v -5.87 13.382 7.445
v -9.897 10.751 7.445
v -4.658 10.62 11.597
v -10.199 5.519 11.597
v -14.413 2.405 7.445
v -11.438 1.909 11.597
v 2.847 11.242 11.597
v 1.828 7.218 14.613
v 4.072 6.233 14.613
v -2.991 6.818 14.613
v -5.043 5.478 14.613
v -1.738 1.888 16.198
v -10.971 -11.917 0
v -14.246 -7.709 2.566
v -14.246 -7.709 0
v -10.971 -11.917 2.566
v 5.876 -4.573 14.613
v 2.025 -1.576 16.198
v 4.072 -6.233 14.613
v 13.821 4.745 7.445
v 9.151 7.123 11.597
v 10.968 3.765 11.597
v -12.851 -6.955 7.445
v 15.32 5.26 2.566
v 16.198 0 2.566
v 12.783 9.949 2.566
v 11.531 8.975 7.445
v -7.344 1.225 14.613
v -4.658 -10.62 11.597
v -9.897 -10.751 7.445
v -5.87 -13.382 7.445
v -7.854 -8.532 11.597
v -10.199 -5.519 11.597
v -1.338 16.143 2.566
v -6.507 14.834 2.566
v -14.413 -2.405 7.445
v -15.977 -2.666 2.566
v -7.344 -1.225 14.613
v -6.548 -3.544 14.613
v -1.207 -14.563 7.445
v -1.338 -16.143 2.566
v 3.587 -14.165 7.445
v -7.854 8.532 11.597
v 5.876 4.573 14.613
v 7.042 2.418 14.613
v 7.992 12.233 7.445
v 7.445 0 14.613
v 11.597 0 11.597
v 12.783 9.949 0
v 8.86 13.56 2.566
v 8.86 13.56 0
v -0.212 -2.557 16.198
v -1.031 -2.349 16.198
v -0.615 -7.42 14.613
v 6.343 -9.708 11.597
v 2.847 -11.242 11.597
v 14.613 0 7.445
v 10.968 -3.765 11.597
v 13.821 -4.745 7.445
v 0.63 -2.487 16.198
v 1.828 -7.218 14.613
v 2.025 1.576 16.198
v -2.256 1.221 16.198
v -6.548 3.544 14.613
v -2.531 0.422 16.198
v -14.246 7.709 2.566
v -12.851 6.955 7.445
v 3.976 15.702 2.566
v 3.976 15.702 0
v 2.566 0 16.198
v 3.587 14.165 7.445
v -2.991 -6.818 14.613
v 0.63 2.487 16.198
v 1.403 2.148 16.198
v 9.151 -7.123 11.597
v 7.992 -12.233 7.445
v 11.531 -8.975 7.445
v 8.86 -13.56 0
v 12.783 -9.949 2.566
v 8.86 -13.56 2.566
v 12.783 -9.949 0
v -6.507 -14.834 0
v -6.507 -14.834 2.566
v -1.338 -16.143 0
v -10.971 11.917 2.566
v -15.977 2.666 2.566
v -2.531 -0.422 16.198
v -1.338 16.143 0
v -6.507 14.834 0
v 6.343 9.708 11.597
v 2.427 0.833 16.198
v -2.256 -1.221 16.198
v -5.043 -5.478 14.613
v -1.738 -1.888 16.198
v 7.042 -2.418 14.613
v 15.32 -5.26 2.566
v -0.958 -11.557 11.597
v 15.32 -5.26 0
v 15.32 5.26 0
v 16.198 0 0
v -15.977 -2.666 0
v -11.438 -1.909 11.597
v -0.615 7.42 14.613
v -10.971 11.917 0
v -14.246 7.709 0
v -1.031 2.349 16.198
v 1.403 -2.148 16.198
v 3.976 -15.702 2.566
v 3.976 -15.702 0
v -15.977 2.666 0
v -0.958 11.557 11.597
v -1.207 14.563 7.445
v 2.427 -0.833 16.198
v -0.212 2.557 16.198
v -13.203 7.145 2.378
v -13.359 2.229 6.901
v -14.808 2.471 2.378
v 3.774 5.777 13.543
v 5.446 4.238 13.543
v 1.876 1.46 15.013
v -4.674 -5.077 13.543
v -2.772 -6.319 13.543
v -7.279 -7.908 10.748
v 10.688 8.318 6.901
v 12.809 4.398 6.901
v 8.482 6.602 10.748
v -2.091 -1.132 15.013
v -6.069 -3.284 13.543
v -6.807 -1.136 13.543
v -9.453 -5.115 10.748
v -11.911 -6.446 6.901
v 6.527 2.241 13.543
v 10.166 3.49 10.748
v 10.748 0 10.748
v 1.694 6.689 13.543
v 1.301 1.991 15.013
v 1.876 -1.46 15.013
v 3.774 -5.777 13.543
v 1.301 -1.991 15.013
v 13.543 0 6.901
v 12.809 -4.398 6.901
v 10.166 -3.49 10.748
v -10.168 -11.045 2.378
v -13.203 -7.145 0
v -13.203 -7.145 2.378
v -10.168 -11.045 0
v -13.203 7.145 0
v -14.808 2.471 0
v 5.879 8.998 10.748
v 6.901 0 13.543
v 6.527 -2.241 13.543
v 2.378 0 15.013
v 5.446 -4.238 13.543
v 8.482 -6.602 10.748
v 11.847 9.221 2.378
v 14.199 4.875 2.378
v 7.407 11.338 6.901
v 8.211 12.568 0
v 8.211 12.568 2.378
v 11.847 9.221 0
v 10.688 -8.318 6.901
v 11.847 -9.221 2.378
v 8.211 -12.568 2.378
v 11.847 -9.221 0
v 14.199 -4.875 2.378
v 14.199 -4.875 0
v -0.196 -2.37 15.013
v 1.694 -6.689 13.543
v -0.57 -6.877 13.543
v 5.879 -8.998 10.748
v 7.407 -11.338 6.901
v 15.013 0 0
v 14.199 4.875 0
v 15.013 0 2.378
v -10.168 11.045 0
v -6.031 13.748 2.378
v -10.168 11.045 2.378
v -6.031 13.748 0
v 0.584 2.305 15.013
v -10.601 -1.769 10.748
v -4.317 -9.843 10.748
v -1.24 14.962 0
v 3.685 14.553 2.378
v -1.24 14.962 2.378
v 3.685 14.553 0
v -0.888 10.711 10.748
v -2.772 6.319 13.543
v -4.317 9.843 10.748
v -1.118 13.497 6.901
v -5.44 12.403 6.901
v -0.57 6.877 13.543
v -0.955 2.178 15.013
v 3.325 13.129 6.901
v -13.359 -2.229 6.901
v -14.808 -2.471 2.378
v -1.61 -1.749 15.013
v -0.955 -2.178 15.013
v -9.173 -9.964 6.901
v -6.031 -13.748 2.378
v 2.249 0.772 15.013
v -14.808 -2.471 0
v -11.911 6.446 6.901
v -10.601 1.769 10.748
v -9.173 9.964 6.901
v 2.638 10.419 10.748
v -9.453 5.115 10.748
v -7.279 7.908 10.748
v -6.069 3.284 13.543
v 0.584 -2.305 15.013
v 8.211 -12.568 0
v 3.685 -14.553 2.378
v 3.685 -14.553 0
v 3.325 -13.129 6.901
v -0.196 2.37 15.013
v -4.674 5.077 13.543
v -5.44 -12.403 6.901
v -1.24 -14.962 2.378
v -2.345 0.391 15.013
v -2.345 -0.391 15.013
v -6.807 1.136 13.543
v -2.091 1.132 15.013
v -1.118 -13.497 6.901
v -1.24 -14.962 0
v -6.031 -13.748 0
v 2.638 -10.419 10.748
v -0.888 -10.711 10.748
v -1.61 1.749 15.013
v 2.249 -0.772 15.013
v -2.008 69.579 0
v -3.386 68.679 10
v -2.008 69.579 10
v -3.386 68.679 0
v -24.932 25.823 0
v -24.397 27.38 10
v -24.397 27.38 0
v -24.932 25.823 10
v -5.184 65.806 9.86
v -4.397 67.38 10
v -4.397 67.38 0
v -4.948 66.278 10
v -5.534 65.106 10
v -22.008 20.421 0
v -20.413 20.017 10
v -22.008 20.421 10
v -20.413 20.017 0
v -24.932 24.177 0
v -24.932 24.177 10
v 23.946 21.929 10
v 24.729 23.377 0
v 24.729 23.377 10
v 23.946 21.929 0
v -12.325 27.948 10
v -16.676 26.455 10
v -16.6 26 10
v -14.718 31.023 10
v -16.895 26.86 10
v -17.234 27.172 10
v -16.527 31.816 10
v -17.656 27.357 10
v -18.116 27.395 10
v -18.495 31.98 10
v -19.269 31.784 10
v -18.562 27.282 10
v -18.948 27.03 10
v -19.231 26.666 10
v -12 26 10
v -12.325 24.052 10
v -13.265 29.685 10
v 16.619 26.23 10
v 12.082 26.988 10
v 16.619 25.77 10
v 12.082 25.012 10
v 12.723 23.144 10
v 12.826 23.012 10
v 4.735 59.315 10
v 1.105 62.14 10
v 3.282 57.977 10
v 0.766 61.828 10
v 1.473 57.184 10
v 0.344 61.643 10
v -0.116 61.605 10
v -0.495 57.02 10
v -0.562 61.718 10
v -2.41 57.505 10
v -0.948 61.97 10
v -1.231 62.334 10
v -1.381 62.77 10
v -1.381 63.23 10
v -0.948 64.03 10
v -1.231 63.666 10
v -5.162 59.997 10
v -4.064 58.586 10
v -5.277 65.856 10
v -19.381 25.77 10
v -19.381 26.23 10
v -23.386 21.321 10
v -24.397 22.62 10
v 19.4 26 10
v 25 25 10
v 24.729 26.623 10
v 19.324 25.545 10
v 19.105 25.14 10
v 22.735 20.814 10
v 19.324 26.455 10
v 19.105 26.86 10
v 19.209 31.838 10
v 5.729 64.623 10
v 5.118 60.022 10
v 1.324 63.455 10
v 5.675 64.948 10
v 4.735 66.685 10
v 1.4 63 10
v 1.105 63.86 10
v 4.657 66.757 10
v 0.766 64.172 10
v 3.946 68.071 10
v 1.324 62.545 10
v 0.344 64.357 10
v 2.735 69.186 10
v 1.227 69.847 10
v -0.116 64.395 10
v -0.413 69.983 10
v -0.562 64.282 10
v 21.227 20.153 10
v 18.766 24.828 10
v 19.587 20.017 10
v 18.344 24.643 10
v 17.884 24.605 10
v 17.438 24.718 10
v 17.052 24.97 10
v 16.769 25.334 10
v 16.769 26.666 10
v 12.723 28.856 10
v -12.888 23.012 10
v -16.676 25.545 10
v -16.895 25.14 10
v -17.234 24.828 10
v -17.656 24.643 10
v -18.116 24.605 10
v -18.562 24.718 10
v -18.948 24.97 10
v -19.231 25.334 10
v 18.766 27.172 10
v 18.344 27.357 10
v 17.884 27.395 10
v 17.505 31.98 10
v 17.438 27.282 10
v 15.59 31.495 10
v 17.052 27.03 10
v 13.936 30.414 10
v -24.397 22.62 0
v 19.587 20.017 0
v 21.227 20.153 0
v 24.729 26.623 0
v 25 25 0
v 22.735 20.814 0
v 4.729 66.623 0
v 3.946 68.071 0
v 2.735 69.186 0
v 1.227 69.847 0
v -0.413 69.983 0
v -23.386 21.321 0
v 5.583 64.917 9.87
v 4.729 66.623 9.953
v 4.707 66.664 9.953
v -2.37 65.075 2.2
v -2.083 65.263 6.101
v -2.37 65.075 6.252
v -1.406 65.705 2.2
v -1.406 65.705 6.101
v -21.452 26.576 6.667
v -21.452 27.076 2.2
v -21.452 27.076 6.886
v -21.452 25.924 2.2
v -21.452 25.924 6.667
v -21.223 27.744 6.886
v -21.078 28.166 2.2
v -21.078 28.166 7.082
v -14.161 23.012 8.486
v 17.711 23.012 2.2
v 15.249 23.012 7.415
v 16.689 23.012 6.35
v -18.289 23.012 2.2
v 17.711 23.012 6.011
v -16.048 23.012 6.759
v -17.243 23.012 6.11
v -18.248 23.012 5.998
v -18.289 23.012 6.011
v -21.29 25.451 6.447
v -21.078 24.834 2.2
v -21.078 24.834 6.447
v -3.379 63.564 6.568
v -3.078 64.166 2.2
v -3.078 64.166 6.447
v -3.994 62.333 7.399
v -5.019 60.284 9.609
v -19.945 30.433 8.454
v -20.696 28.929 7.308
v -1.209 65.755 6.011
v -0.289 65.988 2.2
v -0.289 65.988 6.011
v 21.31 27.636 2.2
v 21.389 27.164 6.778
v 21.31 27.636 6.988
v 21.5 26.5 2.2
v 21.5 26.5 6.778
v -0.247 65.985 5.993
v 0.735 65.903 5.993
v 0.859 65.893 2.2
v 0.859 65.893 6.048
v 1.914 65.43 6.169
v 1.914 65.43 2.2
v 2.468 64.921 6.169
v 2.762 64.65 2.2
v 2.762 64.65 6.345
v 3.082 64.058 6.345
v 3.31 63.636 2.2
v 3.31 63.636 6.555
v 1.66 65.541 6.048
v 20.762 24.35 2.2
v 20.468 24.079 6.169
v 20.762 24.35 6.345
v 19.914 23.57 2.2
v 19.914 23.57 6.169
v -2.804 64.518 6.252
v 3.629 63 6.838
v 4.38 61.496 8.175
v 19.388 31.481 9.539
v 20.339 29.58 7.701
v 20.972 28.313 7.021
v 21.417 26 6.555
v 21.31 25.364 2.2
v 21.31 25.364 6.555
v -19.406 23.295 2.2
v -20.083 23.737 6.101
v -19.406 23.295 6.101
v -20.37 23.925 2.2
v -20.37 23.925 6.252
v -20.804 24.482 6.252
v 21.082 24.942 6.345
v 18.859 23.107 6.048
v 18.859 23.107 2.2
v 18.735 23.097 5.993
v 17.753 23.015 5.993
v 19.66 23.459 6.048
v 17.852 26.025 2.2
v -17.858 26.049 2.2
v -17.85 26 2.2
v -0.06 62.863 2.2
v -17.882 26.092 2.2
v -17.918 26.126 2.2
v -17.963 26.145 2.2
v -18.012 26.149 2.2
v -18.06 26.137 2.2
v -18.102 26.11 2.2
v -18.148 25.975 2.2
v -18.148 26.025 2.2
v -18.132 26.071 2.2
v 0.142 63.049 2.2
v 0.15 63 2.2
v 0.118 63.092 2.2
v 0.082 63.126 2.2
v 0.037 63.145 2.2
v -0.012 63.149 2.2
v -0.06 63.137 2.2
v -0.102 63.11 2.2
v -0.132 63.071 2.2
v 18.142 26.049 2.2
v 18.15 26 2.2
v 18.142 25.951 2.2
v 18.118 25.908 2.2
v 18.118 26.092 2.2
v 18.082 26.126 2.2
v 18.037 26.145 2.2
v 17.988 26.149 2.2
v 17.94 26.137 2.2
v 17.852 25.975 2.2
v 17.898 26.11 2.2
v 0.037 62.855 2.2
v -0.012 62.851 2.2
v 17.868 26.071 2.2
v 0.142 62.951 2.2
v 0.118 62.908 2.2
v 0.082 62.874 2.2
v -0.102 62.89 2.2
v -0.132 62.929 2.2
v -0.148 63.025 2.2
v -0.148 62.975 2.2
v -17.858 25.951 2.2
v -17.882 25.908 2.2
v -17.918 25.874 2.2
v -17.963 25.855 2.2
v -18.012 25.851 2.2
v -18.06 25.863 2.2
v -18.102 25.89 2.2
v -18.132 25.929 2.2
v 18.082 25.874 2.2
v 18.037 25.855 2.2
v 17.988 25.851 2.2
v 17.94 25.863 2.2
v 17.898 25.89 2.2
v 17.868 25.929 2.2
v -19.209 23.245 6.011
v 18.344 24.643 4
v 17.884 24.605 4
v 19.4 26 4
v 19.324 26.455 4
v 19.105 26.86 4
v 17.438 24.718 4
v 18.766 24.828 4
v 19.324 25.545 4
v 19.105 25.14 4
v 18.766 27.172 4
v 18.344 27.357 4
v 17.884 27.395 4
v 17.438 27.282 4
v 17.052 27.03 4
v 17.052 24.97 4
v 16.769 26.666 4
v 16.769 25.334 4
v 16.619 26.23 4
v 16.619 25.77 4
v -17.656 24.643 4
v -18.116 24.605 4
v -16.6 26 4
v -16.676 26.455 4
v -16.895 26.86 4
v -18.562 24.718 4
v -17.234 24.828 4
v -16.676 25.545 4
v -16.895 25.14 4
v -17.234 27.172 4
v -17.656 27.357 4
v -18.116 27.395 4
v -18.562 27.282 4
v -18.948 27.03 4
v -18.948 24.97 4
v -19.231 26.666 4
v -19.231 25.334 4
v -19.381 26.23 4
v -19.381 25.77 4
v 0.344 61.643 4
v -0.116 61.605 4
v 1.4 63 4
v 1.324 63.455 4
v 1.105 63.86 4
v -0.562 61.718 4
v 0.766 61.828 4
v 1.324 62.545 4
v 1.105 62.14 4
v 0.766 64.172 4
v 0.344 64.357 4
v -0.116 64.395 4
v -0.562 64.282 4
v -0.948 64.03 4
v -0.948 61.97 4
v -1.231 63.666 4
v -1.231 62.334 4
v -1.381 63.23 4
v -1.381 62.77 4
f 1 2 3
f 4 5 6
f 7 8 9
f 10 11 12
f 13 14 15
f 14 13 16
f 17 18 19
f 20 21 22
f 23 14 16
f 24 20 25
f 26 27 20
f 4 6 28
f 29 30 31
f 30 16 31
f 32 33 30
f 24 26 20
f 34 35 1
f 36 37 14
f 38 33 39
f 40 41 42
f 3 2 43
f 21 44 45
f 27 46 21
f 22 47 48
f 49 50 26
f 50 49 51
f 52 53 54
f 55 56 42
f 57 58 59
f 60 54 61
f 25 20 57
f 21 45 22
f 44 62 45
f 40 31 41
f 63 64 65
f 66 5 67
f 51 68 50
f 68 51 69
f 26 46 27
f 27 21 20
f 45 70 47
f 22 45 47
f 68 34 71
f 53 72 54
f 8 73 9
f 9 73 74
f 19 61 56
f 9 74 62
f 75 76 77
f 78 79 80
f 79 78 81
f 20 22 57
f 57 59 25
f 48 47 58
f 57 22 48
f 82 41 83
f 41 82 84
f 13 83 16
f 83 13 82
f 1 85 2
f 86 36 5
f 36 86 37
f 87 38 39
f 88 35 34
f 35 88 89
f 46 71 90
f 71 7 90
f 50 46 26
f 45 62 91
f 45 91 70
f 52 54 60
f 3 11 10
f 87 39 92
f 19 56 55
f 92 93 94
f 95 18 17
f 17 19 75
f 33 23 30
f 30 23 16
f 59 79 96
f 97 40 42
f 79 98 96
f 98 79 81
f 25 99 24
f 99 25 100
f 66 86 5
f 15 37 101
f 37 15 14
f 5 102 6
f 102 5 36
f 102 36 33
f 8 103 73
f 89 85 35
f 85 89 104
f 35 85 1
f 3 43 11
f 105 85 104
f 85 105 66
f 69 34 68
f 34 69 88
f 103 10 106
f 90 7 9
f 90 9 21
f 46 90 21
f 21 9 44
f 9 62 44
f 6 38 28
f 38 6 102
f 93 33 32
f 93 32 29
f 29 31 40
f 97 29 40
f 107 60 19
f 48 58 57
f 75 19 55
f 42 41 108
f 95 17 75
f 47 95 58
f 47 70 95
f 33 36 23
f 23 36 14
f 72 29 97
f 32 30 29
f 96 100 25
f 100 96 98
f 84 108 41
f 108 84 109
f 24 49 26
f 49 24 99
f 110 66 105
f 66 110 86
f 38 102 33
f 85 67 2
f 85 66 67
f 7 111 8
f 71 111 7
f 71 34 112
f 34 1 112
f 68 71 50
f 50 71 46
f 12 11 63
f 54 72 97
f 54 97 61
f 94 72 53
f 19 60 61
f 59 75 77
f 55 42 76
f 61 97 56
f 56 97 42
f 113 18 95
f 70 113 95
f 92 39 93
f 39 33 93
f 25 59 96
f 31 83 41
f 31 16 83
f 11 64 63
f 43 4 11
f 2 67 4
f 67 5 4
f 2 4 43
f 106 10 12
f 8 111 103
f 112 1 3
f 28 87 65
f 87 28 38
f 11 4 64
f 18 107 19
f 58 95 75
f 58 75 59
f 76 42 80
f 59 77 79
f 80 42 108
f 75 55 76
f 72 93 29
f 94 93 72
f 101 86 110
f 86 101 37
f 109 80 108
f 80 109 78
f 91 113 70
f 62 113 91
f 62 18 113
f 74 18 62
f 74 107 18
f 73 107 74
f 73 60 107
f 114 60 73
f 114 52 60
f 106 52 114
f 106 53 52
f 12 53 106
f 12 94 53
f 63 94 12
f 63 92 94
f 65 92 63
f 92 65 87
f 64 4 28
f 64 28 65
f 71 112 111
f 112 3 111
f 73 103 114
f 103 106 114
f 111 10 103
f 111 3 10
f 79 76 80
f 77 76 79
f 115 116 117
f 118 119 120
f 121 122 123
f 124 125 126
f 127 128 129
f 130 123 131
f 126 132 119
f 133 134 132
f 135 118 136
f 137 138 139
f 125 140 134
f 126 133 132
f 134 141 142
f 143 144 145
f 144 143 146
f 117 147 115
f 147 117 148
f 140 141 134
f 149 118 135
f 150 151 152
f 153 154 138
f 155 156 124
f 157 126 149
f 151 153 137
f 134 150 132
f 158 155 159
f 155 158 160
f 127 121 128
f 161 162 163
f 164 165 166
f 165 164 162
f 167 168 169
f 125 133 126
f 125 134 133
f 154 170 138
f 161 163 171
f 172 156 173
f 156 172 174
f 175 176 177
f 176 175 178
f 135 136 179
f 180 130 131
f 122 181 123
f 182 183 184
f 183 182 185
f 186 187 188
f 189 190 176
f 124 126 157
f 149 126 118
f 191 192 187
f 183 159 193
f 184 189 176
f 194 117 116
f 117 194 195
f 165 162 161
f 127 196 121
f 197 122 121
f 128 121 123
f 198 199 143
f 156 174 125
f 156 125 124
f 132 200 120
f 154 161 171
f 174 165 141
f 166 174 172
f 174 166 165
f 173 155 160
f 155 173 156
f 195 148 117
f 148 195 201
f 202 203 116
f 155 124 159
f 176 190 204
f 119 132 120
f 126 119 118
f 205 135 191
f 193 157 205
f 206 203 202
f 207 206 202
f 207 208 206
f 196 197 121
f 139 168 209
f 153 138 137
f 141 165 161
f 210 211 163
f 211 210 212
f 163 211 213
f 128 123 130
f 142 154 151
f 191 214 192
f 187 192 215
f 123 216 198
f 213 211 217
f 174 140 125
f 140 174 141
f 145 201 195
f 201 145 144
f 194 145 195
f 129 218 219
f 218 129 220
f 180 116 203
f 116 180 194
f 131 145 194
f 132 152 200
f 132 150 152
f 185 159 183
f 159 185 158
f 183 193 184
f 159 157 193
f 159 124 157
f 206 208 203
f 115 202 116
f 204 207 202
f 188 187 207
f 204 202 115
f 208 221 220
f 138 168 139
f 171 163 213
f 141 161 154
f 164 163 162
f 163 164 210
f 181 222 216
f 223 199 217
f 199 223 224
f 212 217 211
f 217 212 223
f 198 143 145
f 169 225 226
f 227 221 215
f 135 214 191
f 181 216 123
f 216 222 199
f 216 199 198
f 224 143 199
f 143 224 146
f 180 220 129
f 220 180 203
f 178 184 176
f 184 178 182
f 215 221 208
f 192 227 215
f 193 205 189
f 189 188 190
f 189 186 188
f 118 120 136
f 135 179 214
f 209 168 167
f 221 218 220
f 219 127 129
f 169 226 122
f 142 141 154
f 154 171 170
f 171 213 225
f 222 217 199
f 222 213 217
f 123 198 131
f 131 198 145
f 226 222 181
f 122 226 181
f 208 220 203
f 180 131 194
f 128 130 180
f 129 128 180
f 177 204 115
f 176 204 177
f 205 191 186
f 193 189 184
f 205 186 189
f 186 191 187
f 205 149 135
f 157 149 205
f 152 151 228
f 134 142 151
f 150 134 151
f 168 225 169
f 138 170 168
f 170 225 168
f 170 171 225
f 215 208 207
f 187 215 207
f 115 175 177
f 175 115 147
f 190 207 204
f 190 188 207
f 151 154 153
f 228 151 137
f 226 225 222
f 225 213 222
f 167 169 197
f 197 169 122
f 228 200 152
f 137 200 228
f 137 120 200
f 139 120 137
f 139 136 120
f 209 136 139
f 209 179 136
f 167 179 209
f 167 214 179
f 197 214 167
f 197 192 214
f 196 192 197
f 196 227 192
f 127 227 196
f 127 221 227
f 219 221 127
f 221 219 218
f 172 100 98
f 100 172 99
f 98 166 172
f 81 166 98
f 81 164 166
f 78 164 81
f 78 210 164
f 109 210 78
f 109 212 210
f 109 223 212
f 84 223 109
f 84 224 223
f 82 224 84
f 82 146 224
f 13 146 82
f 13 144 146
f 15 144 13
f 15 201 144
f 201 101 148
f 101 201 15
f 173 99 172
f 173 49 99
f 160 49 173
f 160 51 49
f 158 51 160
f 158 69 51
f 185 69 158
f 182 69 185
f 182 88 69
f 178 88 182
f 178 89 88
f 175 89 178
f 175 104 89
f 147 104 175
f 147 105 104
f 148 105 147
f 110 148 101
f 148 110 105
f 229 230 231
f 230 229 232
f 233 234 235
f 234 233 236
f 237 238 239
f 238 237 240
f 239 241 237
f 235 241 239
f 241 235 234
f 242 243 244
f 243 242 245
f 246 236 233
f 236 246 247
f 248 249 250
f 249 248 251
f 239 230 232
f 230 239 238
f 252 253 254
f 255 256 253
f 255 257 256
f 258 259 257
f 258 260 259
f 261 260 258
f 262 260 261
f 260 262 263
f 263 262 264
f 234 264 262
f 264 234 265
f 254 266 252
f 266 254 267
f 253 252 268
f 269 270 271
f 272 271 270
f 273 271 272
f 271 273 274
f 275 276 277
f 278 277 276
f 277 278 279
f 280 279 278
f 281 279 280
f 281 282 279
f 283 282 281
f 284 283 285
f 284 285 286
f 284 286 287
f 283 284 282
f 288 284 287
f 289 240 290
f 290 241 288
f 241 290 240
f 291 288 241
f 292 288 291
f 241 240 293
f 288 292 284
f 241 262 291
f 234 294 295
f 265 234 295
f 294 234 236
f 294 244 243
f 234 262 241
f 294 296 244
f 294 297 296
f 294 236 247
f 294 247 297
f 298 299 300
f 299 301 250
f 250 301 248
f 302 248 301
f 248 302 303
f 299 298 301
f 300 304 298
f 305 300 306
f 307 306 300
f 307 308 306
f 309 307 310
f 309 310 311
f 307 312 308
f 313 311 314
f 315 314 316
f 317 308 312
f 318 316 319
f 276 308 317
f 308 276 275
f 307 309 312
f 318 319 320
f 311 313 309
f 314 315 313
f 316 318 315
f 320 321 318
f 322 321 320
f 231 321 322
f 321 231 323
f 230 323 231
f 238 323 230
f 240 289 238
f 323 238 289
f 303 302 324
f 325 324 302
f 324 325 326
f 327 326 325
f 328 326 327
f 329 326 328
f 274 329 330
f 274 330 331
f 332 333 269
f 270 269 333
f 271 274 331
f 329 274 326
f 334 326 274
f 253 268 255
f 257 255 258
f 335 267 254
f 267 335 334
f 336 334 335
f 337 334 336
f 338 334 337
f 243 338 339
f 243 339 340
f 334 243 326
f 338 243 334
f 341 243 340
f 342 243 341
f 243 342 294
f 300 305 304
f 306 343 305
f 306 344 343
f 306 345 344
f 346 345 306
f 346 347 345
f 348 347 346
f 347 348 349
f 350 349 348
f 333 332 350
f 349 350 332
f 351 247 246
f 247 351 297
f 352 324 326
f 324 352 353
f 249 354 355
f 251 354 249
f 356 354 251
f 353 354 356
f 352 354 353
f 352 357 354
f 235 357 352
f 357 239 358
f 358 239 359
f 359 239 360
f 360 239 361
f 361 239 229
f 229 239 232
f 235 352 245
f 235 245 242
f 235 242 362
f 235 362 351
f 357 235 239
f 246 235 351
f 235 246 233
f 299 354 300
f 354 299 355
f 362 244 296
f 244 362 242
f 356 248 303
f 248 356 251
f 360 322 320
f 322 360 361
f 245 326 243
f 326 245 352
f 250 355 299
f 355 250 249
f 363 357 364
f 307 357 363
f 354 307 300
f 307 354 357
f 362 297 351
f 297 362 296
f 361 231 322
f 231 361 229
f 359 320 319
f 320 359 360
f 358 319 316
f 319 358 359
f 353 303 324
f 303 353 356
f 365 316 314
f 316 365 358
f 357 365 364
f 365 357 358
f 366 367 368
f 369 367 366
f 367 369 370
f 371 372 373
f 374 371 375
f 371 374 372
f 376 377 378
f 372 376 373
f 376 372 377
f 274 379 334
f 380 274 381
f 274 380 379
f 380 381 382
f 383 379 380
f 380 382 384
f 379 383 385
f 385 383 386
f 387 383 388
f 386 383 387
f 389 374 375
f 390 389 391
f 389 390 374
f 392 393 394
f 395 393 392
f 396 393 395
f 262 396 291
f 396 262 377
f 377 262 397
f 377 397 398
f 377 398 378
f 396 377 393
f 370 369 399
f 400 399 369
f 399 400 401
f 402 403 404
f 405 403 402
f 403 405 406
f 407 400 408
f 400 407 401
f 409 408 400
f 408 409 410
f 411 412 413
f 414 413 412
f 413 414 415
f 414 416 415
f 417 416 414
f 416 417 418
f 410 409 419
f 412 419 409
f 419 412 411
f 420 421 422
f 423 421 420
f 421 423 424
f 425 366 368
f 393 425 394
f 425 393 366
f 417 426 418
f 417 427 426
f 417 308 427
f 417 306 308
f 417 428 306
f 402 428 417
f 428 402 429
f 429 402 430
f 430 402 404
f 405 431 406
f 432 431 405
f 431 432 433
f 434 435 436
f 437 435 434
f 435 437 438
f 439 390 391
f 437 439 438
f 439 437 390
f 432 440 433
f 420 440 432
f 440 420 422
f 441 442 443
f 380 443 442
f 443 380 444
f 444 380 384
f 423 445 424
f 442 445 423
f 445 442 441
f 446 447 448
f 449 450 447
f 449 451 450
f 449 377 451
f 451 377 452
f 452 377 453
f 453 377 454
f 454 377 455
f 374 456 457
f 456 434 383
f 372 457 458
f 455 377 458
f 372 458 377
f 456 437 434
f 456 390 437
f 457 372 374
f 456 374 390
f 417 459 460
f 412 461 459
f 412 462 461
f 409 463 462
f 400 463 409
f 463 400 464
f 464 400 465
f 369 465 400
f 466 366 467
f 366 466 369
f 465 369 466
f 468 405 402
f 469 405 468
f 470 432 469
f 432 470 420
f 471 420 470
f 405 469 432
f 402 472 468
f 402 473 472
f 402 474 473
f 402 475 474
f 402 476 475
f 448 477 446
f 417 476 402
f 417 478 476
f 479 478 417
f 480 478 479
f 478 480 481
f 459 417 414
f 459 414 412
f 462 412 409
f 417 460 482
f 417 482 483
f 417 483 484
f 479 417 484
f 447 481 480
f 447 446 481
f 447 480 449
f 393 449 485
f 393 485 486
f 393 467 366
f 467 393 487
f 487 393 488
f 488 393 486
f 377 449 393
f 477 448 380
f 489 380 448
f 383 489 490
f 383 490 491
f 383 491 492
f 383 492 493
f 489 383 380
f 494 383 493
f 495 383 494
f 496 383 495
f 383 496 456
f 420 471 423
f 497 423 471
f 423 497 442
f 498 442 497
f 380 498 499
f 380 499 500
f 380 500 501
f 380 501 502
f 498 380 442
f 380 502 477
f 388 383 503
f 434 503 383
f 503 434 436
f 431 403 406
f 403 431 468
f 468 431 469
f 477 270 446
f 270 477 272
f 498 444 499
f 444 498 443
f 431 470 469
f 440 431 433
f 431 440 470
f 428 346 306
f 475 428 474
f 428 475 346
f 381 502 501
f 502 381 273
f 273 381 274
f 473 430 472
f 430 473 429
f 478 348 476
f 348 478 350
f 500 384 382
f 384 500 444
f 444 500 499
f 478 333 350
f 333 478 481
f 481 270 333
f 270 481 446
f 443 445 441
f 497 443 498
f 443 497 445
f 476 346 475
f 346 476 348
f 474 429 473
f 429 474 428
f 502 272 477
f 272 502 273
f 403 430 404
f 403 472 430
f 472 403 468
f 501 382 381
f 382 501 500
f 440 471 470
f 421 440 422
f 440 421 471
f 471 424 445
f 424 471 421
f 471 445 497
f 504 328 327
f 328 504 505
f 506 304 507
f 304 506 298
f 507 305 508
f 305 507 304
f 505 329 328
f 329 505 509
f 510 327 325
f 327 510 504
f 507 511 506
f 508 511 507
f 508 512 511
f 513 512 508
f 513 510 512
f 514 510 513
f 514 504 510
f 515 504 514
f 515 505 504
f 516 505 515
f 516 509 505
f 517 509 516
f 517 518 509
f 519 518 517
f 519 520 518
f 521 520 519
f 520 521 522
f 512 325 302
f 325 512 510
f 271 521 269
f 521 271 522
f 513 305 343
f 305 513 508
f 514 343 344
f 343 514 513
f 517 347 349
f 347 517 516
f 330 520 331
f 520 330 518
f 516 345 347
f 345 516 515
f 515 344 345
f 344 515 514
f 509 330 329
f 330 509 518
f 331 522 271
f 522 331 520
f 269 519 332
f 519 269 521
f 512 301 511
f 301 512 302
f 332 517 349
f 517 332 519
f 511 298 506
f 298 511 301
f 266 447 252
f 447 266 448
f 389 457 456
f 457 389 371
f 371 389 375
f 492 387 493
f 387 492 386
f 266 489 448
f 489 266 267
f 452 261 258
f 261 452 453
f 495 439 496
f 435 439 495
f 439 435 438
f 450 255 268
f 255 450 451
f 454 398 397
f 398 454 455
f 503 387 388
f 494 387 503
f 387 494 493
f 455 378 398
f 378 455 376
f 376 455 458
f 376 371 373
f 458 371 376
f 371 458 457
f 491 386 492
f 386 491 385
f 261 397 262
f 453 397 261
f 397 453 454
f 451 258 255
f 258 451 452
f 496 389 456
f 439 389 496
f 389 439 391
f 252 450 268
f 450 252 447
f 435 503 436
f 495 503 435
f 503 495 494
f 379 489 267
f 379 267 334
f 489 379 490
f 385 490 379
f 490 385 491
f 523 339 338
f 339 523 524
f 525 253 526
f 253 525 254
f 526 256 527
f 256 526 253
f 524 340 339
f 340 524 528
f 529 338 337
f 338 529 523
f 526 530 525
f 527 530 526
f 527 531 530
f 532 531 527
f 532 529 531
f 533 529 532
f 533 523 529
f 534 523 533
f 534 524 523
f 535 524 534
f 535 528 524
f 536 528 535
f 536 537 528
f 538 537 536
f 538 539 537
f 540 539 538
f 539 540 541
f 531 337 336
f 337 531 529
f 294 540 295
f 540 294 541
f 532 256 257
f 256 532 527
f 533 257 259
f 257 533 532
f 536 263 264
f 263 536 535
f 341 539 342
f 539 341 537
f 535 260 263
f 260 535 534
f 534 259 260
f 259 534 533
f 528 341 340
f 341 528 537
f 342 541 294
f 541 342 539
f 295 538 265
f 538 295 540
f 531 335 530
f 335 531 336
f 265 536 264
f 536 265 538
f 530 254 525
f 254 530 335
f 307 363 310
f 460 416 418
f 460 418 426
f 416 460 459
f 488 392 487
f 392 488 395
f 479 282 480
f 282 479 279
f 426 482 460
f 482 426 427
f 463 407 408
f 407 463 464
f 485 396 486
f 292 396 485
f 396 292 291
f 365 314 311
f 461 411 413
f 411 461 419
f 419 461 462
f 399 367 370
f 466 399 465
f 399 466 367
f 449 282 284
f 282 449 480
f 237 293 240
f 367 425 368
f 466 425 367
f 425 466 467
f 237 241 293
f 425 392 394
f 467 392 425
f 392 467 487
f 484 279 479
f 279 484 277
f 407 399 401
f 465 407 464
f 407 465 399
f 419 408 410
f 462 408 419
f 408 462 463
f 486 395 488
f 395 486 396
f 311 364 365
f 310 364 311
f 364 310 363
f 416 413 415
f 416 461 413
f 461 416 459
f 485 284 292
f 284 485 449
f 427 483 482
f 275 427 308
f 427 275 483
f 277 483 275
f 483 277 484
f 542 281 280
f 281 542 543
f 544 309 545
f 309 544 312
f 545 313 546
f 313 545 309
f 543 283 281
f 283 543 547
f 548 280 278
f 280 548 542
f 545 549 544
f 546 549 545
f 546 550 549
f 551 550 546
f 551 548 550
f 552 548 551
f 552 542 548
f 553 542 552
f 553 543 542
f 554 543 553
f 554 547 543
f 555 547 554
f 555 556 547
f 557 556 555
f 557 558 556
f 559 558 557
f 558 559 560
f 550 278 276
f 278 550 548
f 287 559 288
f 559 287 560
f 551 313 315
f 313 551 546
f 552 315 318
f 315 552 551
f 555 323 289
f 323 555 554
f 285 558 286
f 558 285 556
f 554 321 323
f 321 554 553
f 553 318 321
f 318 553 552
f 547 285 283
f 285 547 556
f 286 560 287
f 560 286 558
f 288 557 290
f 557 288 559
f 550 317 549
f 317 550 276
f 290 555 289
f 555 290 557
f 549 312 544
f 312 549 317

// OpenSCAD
h= 9;
ledR=16.4;
len = 18;

module reflector(){
  difference()
  {
    linear_extrude(height = 21) scale(0.32,1,1) import("Blinker.dxf");
    translate([18,-3,6]) linear_extrude(height = 21) scale(0.27,1,1) import("Blinker.dxf");
  }
}


module frontBlinker(){
 difference(){ 
   sphere(r=ledR);
   sphere(r=ledR-1.2);
   translate([0,0,-ledR]) cube([2*ledR, 2*ledR, 2*ledR], center=true);
 } 
}

module Arow(l,ra){
  minkowski(){
    linear_extrude(height=h)
	   polygon(points = [ [-l, 0], [l, 0], [0, 2*l]]);
    cylinder(r=ra);
  }
}

module mountPoint(mr, mheight){
  difference(){
    cylinder(r=0, r2= mr, h=mheight);
    translate([0,0,2]) cylinder(r=1.4, h = mheight-2);
  }
}


module rearBlinker(){
  difference(){
    Arow(len+2,5);
    translate([0,1.5,2.2]) Arow(len,3.5);
  }
  translate([len,1,2]) mountPoint(6,h-1);
  translate([-(len),1,2]) mountPoint(6,h-1);
  translate([0,2*len+2,2]) mountPoint(6,h-1);
}

$fn=19;
frontBlinker();
translate([0,25,0]) rearBlinker();
